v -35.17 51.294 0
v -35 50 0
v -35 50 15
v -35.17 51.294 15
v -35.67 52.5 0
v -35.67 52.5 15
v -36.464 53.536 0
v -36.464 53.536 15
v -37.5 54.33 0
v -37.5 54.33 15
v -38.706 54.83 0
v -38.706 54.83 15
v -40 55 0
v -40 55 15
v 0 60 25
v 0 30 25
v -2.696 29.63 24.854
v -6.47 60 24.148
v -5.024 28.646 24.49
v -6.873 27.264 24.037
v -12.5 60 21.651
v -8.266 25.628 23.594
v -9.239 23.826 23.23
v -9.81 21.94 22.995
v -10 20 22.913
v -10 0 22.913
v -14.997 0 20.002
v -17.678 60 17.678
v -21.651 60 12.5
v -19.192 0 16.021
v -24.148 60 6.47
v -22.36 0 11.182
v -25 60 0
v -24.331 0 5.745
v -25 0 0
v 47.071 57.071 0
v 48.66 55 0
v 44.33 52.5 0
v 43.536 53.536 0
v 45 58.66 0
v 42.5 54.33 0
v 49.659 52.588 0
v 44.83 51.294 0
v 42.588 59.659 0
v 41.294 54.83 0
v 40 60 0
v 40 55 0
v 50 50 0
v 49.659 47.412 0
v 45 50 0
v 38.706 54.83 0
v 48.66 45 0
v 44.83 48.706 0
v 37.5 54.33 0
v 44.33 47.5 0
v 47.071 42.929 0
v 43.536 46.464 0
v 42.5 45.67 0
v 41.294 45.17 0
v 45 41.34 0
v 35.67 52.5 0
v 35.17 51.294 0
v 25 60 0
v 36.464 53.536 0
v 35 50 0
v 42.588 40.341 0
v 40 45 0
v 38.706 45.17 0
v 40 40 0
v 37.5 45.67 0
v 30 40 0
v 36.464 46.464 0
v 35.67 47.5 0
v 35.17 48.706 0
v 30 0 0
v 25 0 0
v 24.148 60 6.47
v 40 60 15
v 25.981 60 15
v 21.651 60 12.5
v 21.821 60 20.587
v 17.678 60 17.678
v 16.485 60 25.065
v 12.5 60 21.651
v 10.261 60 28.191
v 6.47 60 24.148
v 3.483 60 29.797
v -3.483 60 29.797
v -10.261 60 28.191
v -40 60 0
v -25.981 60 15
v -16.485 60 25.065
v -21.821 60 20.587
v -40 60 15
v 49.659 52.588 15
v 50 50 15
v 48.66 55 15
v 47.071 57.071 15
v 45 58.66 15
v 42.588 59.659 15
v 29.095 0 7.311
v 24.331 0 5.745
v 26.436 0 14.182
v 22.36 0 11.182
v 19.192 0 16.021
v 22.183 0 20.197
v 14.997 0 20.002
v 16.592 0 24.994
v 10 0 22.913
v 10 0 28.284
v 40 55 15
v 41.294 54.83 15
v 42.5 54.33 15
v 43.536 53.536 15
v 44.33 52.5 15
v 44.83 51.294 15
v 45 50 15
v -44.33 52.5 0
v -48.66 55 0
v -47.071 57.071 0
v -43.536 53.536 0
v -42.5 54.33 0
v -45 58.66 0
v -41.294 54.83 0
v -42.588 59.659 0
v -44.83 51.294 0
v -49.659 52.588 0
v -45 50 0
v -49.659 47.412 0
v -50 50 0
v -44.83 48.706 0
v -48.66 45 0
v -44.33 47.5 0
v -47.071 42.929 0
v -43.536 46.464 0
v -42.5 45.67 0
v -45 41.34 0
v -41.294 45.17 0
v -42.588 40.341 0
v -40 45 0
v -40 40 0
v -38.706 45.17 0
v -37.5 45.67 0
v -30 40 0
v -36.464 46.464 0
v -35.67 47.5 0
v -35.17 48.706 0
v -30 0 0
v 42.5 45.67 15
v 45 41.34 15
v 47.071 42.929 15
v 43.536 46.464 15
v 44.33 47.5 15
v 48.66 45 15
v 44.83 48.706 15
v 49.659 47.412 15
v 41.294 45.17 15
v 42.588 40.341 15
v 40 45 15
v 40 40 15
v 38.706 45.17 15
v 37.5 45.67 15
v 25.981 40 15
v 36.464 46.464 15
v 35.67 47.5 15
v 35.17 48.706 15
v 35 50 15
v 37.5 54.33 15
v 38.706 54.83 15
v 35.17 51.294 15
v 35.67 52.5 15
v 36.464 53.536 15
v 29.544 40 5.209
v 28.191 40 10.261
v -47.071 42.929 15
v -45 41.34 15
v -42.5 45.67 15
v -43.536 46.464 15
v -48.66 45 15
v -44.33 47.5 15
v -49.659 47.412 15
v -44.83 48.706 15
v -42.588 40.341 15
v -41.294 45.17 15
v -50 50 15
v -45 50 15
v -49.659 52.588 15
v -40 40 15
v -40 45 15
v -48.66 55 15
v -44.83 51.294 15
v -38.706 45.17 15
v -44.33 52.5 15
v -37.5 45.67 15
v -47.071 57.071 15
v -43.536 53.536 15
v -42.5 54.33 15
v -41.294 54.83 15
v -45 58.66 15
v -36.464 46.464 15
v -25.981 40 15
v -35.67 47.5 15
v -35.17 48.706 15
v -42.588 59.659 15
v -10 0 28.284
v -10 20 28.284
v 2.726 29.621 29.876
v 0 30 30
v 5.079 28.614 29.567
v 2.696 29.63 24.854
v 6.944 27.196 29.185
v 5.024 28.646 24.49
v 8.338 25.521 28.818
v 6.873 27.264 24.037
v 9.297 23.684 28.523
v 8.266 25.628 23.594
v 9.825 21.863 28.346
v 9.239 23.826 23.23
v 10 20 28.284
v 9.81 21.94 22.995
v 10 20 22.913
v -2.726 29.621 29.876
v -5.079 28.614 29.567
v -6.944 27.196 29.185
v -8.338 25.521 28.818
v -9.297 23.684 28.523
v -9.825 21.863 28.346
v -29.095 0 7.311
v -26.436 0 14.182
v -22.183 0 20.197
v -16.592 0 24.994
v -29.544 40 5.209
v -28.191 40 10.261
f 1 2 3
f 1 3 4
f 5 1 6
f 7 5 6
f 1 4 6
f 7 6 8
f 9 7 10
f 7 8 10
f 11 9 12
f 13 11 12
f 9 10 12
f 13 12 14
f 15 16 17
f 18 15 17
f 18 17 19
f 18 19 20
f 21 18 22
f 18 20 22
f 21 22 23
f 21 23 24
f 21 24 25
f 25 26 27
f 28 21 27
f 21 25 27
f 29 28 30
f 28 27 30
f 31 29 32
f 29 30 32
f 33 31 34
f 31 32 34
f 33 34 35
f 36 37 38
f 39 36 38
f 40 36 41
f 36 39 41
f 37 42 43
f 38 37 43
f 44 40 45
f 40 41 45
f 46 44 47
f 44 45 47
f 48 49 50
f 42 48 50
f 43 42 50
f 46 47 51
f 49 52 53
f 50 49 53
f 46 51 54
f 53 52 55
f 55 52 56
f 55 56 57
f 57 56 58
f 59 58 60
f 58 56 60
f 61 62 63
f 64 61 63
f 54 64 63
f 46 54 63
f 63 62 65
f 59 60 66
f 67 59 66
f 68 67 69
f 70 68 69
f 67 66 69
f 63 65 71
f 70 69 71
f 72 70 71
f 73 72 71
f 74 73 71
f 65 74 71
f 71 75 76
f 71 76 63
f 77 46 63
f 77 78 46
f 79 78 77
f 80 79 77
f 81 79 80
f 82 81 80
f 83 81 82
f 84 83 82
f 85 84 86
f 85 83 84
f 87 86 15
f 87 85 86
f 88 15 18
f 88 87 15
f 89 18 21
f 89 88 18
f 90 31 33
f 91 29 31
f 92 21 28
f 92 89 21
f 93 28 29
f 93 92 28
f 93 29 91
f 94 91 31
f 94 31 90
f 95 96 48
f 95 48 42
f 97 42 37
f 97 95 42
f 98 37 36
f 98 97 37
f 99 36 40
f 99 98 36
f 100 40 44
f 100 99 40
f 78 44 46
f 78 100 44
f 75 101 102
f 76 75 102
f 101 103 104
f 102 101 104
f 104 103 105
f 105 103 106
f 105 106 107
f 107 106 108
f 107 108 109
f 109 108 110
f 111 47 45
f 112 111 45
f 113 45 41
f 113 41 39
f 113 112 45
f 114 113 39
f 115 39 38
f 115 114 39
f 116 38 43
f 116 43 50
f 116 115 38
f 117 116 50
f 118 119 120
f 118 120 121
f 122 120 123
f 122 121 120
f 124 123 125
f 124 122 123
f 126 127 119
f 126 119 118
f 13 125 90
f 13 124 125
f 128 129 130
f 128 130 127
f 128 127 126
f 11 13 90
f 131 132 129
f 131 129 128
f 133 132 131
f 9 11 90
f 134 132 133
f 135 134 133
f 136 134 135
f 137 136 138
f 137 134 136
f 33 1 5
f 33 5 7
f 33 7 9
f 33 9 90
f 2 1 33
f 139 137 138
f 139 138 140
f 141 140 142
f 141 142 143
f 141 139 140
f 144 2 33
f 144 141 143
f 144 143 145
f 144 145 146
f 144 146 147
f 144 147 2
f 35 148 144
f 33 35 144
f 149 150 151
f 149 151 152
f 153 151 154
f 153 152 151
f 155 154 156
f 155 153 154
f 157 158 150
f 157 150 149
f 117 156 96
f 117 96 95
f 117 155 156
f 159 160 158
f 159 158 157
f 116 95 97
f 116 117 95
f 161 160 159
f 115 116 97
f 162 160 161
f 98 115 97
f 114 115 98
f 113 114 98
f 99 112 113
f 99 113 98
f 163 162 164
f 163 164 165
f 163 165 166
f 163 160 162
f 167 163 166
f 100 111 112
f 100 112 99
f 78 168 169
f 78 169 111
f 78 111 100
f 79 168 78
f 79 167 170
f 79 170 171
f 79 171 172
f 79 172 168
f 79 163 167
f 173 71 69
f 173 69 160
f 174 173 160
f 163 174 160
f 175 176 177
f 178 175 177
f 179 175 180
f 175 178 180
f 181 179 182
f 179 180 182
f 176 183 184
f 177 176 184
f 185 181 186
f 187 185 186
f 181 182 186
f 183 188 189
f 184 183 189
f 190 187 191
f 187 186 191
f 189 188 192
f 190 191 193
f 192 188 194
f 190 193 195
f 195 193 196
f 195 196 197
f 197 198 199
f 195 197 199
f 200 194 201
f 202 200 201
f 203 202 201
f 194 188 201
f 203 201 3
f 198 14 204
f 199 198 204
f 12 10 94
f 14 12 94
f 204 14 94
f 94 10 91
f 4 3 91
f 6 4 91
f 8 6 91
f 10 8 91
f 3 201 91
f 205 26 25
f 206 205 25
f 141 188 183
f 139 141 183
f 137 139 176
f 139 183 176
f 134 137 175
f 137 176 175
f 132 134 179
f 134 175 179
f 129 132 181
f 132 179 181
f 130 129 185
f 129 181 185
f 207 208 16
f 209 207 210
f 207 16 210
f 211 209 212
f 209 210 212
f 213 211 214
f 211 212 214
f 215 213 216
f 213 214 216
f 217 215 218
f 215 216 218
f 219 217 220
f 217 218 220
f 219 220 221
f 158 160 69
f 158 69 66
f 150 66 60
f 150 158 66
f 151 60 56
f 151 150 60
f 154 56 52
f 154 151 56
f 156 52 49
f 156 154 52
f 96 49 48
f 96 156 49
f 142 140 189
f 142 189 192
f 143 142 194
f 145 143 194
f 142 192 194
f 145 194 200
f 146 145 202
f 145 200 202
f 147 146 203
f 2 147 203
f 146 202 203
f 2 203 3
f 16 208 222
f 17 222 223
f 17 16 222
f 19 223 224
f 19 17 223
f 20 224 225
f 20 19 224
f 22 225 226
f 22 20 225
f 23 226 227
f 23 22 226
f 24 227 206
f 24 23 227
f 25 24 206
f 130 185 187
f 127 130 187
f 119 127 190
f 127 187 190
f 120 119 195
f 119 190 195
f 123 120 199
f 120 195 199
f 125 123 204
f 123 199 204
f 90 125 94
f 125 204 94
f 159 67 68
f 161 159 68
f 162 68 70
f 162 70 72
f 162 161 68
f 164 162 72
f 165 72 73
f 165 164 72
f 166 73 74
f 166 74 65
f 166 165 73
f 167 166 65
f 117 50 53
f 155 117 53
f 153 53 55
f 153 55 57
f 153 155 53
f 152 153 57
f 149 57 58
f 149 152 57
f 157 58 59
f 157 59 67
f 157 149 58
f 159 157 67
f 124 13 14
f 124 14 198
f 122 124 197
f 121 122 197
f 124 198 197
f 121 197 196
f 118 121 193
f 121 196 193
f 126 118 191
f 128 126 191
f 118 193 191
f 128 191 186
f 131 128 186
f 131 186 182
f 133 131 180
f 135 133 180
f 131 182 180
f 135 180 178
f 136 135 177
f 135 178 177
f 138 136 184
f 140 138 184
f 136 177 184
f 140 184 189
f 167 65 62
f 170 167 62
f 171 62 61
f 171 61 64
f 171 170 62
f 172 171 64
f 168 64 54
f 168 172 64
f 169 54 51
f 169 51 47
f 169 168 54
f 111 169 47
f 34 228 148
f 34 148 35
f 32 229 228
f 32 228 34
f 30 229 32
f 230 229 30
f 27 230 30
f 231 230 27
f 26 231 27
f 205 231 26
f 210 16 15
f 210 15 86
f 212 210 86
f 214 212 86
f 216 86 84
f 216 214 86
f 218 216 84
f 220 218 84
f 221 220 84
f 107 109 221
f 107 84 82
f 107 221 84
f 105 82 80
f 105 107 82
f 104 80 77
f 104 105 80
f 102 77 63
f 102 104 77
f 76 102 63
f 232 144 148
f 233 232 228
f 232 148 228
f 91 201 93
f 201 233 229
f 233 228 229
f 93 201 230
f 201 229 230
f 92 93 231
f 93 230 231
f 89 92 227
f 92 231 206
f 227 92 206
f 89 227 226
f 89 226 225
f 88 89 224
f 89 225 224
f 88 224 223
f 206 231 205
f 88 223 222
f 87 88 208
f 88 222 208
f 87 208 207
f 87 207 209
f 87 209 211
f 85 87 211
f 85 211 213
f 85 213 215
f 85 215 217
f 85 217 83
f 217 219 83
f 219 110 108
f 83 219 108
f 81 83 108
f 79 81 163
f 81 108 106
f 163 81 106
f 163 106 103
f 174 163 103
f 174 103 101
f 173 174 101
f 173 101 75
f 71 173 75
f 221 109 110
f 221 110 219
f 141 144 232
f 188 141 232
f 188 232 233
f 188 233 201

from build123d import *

# Parameters (mm, degrees)
F1_DEPTH = 60
F2_W     = 20
F2_H     = 15
F3_DEPTH = 50
F5_DEPTH = 60.001
F6_W     = 10
F6_H     = 20
F7_DEPTH = 30.001
F8_DEPTH = 15.0010001


with BuildPart() as f1:
    # F0 (on Front) → F1 (new body)
    with BuildSketch(Plane.XZ):
        with BuildLine():
            ThreePointArc((0, 25), (-17.6776695297, 17.6776695297), (-25, 0))
            Line((-25, 0), (0, 0))
            Line((0, 0), (0, 25))
        make_face()
        with BuildLine():
            ThreePointArc((0, 30), (-21.2132034356, 21.2132034356), (-30, 0))
            Line((-30, 0), (-25, 0))
            ThreePointArc((-25, 0), (-17.6776695297, 17.6776695297), (0, 25))
            Line((0, 25), (0, 30))
        make_face()
    extrude(amount=-F1_DEPTH)

    # F2 (on face) → F3 (join)
    with BuildSketch(Plane.YZ):
        with Locations((50, 7.5)):
            Rectangle(F2_W, F2_H)
    extrude(amount=-F3_DEPTH)

    # F0 (on Front) → F5 (cut, through all)
    with BuildSketch(Plane.XZ):
        with BuildLine():
            ThreePointArc((0, 25), (-17.6776695297, 17.6776695297), (-25, 0))
            Line((-25, 0), (0, 0))
            Line((0, 0), (0, 25))
        make_face()
    extrude(amount=-F5_DEPTH, mode=Mode.SUBTRACT)

    # F6 (on Top) → F7 (cut, through all)
    with BuildSketch(Plane.XY):
        with Locations((-5, 10)):
            Rectangle(F6_W, F6_H)
        with BuildLine():
            Line((-10, 20), (0, 20))
            Line((0, 20), (0, 30))
            ThreePointArc((0, 30), (-7.0710678119, 27.0710678119), (-10, 20))
        make_face()
    extrude(amount=F7_DEPTH, mode=Mode.SUBTRACT)

    # F4 (on face) → F8 (cut, through all)
    with BuildSketch(Plane.XY.offset(15)):
        with BuildLine():
            ThreePointArc((-40, 40), (-47.0710678119, 42.9289321881), (-50, 50))
            Line((-50, 50), (-50, 40))
            Line((-50, 40), (-40, 40))
        make_face()
        with BuildLine():
            Line((-40, 60), (-50, 60))
            Line((-50, 60), (-50, 50))
            ThreePointArc((-50, 50), (-47.0710678119, 57.0710678119), (-40, 60))
        make_face()
        with BuildLine():
            Line((-40, 50), (-45, 50))
            ThreePointArc((-45, 50), (-43.5355339059, 46.4644660941), (-40, 45))
            Line((-40, 45), (-40, 50))
        make_face()
        with BuildLine():
            Line((-35, 50), (-40, 50))
            Line((-40, 50), (-40, 45))
            ThreePointArc((-40, 45), (-36.4644660941, 46.4644660941), (-35, 50))
        make_face()
        with BuildLine():
            ThreePointArc((-35, 50), (-36.4644660941, 53.5355339059), (-40, 55))
            Line((-40, 55), (-40, 50))
            Line((-40, 50), (-35, 50))
        make_face()
        with BuildLine():
            ThreePointArc((-40, 55), (-43.5355339059, 53.5355339059), (-45, 50))
            Line((-45, 50), (-40, 50))
            Line((-40, 50), (-40, 55))
        make_face()
    extrude(amount=-F8_DEPTH, mode=Mode.SUBTRACT)

    # F9: F1 across plane


with BuildPart() as f1_1:
    add(f1.part)
    add(f1.part.mirror(Plane.YZ))


solid = f1_1.part
